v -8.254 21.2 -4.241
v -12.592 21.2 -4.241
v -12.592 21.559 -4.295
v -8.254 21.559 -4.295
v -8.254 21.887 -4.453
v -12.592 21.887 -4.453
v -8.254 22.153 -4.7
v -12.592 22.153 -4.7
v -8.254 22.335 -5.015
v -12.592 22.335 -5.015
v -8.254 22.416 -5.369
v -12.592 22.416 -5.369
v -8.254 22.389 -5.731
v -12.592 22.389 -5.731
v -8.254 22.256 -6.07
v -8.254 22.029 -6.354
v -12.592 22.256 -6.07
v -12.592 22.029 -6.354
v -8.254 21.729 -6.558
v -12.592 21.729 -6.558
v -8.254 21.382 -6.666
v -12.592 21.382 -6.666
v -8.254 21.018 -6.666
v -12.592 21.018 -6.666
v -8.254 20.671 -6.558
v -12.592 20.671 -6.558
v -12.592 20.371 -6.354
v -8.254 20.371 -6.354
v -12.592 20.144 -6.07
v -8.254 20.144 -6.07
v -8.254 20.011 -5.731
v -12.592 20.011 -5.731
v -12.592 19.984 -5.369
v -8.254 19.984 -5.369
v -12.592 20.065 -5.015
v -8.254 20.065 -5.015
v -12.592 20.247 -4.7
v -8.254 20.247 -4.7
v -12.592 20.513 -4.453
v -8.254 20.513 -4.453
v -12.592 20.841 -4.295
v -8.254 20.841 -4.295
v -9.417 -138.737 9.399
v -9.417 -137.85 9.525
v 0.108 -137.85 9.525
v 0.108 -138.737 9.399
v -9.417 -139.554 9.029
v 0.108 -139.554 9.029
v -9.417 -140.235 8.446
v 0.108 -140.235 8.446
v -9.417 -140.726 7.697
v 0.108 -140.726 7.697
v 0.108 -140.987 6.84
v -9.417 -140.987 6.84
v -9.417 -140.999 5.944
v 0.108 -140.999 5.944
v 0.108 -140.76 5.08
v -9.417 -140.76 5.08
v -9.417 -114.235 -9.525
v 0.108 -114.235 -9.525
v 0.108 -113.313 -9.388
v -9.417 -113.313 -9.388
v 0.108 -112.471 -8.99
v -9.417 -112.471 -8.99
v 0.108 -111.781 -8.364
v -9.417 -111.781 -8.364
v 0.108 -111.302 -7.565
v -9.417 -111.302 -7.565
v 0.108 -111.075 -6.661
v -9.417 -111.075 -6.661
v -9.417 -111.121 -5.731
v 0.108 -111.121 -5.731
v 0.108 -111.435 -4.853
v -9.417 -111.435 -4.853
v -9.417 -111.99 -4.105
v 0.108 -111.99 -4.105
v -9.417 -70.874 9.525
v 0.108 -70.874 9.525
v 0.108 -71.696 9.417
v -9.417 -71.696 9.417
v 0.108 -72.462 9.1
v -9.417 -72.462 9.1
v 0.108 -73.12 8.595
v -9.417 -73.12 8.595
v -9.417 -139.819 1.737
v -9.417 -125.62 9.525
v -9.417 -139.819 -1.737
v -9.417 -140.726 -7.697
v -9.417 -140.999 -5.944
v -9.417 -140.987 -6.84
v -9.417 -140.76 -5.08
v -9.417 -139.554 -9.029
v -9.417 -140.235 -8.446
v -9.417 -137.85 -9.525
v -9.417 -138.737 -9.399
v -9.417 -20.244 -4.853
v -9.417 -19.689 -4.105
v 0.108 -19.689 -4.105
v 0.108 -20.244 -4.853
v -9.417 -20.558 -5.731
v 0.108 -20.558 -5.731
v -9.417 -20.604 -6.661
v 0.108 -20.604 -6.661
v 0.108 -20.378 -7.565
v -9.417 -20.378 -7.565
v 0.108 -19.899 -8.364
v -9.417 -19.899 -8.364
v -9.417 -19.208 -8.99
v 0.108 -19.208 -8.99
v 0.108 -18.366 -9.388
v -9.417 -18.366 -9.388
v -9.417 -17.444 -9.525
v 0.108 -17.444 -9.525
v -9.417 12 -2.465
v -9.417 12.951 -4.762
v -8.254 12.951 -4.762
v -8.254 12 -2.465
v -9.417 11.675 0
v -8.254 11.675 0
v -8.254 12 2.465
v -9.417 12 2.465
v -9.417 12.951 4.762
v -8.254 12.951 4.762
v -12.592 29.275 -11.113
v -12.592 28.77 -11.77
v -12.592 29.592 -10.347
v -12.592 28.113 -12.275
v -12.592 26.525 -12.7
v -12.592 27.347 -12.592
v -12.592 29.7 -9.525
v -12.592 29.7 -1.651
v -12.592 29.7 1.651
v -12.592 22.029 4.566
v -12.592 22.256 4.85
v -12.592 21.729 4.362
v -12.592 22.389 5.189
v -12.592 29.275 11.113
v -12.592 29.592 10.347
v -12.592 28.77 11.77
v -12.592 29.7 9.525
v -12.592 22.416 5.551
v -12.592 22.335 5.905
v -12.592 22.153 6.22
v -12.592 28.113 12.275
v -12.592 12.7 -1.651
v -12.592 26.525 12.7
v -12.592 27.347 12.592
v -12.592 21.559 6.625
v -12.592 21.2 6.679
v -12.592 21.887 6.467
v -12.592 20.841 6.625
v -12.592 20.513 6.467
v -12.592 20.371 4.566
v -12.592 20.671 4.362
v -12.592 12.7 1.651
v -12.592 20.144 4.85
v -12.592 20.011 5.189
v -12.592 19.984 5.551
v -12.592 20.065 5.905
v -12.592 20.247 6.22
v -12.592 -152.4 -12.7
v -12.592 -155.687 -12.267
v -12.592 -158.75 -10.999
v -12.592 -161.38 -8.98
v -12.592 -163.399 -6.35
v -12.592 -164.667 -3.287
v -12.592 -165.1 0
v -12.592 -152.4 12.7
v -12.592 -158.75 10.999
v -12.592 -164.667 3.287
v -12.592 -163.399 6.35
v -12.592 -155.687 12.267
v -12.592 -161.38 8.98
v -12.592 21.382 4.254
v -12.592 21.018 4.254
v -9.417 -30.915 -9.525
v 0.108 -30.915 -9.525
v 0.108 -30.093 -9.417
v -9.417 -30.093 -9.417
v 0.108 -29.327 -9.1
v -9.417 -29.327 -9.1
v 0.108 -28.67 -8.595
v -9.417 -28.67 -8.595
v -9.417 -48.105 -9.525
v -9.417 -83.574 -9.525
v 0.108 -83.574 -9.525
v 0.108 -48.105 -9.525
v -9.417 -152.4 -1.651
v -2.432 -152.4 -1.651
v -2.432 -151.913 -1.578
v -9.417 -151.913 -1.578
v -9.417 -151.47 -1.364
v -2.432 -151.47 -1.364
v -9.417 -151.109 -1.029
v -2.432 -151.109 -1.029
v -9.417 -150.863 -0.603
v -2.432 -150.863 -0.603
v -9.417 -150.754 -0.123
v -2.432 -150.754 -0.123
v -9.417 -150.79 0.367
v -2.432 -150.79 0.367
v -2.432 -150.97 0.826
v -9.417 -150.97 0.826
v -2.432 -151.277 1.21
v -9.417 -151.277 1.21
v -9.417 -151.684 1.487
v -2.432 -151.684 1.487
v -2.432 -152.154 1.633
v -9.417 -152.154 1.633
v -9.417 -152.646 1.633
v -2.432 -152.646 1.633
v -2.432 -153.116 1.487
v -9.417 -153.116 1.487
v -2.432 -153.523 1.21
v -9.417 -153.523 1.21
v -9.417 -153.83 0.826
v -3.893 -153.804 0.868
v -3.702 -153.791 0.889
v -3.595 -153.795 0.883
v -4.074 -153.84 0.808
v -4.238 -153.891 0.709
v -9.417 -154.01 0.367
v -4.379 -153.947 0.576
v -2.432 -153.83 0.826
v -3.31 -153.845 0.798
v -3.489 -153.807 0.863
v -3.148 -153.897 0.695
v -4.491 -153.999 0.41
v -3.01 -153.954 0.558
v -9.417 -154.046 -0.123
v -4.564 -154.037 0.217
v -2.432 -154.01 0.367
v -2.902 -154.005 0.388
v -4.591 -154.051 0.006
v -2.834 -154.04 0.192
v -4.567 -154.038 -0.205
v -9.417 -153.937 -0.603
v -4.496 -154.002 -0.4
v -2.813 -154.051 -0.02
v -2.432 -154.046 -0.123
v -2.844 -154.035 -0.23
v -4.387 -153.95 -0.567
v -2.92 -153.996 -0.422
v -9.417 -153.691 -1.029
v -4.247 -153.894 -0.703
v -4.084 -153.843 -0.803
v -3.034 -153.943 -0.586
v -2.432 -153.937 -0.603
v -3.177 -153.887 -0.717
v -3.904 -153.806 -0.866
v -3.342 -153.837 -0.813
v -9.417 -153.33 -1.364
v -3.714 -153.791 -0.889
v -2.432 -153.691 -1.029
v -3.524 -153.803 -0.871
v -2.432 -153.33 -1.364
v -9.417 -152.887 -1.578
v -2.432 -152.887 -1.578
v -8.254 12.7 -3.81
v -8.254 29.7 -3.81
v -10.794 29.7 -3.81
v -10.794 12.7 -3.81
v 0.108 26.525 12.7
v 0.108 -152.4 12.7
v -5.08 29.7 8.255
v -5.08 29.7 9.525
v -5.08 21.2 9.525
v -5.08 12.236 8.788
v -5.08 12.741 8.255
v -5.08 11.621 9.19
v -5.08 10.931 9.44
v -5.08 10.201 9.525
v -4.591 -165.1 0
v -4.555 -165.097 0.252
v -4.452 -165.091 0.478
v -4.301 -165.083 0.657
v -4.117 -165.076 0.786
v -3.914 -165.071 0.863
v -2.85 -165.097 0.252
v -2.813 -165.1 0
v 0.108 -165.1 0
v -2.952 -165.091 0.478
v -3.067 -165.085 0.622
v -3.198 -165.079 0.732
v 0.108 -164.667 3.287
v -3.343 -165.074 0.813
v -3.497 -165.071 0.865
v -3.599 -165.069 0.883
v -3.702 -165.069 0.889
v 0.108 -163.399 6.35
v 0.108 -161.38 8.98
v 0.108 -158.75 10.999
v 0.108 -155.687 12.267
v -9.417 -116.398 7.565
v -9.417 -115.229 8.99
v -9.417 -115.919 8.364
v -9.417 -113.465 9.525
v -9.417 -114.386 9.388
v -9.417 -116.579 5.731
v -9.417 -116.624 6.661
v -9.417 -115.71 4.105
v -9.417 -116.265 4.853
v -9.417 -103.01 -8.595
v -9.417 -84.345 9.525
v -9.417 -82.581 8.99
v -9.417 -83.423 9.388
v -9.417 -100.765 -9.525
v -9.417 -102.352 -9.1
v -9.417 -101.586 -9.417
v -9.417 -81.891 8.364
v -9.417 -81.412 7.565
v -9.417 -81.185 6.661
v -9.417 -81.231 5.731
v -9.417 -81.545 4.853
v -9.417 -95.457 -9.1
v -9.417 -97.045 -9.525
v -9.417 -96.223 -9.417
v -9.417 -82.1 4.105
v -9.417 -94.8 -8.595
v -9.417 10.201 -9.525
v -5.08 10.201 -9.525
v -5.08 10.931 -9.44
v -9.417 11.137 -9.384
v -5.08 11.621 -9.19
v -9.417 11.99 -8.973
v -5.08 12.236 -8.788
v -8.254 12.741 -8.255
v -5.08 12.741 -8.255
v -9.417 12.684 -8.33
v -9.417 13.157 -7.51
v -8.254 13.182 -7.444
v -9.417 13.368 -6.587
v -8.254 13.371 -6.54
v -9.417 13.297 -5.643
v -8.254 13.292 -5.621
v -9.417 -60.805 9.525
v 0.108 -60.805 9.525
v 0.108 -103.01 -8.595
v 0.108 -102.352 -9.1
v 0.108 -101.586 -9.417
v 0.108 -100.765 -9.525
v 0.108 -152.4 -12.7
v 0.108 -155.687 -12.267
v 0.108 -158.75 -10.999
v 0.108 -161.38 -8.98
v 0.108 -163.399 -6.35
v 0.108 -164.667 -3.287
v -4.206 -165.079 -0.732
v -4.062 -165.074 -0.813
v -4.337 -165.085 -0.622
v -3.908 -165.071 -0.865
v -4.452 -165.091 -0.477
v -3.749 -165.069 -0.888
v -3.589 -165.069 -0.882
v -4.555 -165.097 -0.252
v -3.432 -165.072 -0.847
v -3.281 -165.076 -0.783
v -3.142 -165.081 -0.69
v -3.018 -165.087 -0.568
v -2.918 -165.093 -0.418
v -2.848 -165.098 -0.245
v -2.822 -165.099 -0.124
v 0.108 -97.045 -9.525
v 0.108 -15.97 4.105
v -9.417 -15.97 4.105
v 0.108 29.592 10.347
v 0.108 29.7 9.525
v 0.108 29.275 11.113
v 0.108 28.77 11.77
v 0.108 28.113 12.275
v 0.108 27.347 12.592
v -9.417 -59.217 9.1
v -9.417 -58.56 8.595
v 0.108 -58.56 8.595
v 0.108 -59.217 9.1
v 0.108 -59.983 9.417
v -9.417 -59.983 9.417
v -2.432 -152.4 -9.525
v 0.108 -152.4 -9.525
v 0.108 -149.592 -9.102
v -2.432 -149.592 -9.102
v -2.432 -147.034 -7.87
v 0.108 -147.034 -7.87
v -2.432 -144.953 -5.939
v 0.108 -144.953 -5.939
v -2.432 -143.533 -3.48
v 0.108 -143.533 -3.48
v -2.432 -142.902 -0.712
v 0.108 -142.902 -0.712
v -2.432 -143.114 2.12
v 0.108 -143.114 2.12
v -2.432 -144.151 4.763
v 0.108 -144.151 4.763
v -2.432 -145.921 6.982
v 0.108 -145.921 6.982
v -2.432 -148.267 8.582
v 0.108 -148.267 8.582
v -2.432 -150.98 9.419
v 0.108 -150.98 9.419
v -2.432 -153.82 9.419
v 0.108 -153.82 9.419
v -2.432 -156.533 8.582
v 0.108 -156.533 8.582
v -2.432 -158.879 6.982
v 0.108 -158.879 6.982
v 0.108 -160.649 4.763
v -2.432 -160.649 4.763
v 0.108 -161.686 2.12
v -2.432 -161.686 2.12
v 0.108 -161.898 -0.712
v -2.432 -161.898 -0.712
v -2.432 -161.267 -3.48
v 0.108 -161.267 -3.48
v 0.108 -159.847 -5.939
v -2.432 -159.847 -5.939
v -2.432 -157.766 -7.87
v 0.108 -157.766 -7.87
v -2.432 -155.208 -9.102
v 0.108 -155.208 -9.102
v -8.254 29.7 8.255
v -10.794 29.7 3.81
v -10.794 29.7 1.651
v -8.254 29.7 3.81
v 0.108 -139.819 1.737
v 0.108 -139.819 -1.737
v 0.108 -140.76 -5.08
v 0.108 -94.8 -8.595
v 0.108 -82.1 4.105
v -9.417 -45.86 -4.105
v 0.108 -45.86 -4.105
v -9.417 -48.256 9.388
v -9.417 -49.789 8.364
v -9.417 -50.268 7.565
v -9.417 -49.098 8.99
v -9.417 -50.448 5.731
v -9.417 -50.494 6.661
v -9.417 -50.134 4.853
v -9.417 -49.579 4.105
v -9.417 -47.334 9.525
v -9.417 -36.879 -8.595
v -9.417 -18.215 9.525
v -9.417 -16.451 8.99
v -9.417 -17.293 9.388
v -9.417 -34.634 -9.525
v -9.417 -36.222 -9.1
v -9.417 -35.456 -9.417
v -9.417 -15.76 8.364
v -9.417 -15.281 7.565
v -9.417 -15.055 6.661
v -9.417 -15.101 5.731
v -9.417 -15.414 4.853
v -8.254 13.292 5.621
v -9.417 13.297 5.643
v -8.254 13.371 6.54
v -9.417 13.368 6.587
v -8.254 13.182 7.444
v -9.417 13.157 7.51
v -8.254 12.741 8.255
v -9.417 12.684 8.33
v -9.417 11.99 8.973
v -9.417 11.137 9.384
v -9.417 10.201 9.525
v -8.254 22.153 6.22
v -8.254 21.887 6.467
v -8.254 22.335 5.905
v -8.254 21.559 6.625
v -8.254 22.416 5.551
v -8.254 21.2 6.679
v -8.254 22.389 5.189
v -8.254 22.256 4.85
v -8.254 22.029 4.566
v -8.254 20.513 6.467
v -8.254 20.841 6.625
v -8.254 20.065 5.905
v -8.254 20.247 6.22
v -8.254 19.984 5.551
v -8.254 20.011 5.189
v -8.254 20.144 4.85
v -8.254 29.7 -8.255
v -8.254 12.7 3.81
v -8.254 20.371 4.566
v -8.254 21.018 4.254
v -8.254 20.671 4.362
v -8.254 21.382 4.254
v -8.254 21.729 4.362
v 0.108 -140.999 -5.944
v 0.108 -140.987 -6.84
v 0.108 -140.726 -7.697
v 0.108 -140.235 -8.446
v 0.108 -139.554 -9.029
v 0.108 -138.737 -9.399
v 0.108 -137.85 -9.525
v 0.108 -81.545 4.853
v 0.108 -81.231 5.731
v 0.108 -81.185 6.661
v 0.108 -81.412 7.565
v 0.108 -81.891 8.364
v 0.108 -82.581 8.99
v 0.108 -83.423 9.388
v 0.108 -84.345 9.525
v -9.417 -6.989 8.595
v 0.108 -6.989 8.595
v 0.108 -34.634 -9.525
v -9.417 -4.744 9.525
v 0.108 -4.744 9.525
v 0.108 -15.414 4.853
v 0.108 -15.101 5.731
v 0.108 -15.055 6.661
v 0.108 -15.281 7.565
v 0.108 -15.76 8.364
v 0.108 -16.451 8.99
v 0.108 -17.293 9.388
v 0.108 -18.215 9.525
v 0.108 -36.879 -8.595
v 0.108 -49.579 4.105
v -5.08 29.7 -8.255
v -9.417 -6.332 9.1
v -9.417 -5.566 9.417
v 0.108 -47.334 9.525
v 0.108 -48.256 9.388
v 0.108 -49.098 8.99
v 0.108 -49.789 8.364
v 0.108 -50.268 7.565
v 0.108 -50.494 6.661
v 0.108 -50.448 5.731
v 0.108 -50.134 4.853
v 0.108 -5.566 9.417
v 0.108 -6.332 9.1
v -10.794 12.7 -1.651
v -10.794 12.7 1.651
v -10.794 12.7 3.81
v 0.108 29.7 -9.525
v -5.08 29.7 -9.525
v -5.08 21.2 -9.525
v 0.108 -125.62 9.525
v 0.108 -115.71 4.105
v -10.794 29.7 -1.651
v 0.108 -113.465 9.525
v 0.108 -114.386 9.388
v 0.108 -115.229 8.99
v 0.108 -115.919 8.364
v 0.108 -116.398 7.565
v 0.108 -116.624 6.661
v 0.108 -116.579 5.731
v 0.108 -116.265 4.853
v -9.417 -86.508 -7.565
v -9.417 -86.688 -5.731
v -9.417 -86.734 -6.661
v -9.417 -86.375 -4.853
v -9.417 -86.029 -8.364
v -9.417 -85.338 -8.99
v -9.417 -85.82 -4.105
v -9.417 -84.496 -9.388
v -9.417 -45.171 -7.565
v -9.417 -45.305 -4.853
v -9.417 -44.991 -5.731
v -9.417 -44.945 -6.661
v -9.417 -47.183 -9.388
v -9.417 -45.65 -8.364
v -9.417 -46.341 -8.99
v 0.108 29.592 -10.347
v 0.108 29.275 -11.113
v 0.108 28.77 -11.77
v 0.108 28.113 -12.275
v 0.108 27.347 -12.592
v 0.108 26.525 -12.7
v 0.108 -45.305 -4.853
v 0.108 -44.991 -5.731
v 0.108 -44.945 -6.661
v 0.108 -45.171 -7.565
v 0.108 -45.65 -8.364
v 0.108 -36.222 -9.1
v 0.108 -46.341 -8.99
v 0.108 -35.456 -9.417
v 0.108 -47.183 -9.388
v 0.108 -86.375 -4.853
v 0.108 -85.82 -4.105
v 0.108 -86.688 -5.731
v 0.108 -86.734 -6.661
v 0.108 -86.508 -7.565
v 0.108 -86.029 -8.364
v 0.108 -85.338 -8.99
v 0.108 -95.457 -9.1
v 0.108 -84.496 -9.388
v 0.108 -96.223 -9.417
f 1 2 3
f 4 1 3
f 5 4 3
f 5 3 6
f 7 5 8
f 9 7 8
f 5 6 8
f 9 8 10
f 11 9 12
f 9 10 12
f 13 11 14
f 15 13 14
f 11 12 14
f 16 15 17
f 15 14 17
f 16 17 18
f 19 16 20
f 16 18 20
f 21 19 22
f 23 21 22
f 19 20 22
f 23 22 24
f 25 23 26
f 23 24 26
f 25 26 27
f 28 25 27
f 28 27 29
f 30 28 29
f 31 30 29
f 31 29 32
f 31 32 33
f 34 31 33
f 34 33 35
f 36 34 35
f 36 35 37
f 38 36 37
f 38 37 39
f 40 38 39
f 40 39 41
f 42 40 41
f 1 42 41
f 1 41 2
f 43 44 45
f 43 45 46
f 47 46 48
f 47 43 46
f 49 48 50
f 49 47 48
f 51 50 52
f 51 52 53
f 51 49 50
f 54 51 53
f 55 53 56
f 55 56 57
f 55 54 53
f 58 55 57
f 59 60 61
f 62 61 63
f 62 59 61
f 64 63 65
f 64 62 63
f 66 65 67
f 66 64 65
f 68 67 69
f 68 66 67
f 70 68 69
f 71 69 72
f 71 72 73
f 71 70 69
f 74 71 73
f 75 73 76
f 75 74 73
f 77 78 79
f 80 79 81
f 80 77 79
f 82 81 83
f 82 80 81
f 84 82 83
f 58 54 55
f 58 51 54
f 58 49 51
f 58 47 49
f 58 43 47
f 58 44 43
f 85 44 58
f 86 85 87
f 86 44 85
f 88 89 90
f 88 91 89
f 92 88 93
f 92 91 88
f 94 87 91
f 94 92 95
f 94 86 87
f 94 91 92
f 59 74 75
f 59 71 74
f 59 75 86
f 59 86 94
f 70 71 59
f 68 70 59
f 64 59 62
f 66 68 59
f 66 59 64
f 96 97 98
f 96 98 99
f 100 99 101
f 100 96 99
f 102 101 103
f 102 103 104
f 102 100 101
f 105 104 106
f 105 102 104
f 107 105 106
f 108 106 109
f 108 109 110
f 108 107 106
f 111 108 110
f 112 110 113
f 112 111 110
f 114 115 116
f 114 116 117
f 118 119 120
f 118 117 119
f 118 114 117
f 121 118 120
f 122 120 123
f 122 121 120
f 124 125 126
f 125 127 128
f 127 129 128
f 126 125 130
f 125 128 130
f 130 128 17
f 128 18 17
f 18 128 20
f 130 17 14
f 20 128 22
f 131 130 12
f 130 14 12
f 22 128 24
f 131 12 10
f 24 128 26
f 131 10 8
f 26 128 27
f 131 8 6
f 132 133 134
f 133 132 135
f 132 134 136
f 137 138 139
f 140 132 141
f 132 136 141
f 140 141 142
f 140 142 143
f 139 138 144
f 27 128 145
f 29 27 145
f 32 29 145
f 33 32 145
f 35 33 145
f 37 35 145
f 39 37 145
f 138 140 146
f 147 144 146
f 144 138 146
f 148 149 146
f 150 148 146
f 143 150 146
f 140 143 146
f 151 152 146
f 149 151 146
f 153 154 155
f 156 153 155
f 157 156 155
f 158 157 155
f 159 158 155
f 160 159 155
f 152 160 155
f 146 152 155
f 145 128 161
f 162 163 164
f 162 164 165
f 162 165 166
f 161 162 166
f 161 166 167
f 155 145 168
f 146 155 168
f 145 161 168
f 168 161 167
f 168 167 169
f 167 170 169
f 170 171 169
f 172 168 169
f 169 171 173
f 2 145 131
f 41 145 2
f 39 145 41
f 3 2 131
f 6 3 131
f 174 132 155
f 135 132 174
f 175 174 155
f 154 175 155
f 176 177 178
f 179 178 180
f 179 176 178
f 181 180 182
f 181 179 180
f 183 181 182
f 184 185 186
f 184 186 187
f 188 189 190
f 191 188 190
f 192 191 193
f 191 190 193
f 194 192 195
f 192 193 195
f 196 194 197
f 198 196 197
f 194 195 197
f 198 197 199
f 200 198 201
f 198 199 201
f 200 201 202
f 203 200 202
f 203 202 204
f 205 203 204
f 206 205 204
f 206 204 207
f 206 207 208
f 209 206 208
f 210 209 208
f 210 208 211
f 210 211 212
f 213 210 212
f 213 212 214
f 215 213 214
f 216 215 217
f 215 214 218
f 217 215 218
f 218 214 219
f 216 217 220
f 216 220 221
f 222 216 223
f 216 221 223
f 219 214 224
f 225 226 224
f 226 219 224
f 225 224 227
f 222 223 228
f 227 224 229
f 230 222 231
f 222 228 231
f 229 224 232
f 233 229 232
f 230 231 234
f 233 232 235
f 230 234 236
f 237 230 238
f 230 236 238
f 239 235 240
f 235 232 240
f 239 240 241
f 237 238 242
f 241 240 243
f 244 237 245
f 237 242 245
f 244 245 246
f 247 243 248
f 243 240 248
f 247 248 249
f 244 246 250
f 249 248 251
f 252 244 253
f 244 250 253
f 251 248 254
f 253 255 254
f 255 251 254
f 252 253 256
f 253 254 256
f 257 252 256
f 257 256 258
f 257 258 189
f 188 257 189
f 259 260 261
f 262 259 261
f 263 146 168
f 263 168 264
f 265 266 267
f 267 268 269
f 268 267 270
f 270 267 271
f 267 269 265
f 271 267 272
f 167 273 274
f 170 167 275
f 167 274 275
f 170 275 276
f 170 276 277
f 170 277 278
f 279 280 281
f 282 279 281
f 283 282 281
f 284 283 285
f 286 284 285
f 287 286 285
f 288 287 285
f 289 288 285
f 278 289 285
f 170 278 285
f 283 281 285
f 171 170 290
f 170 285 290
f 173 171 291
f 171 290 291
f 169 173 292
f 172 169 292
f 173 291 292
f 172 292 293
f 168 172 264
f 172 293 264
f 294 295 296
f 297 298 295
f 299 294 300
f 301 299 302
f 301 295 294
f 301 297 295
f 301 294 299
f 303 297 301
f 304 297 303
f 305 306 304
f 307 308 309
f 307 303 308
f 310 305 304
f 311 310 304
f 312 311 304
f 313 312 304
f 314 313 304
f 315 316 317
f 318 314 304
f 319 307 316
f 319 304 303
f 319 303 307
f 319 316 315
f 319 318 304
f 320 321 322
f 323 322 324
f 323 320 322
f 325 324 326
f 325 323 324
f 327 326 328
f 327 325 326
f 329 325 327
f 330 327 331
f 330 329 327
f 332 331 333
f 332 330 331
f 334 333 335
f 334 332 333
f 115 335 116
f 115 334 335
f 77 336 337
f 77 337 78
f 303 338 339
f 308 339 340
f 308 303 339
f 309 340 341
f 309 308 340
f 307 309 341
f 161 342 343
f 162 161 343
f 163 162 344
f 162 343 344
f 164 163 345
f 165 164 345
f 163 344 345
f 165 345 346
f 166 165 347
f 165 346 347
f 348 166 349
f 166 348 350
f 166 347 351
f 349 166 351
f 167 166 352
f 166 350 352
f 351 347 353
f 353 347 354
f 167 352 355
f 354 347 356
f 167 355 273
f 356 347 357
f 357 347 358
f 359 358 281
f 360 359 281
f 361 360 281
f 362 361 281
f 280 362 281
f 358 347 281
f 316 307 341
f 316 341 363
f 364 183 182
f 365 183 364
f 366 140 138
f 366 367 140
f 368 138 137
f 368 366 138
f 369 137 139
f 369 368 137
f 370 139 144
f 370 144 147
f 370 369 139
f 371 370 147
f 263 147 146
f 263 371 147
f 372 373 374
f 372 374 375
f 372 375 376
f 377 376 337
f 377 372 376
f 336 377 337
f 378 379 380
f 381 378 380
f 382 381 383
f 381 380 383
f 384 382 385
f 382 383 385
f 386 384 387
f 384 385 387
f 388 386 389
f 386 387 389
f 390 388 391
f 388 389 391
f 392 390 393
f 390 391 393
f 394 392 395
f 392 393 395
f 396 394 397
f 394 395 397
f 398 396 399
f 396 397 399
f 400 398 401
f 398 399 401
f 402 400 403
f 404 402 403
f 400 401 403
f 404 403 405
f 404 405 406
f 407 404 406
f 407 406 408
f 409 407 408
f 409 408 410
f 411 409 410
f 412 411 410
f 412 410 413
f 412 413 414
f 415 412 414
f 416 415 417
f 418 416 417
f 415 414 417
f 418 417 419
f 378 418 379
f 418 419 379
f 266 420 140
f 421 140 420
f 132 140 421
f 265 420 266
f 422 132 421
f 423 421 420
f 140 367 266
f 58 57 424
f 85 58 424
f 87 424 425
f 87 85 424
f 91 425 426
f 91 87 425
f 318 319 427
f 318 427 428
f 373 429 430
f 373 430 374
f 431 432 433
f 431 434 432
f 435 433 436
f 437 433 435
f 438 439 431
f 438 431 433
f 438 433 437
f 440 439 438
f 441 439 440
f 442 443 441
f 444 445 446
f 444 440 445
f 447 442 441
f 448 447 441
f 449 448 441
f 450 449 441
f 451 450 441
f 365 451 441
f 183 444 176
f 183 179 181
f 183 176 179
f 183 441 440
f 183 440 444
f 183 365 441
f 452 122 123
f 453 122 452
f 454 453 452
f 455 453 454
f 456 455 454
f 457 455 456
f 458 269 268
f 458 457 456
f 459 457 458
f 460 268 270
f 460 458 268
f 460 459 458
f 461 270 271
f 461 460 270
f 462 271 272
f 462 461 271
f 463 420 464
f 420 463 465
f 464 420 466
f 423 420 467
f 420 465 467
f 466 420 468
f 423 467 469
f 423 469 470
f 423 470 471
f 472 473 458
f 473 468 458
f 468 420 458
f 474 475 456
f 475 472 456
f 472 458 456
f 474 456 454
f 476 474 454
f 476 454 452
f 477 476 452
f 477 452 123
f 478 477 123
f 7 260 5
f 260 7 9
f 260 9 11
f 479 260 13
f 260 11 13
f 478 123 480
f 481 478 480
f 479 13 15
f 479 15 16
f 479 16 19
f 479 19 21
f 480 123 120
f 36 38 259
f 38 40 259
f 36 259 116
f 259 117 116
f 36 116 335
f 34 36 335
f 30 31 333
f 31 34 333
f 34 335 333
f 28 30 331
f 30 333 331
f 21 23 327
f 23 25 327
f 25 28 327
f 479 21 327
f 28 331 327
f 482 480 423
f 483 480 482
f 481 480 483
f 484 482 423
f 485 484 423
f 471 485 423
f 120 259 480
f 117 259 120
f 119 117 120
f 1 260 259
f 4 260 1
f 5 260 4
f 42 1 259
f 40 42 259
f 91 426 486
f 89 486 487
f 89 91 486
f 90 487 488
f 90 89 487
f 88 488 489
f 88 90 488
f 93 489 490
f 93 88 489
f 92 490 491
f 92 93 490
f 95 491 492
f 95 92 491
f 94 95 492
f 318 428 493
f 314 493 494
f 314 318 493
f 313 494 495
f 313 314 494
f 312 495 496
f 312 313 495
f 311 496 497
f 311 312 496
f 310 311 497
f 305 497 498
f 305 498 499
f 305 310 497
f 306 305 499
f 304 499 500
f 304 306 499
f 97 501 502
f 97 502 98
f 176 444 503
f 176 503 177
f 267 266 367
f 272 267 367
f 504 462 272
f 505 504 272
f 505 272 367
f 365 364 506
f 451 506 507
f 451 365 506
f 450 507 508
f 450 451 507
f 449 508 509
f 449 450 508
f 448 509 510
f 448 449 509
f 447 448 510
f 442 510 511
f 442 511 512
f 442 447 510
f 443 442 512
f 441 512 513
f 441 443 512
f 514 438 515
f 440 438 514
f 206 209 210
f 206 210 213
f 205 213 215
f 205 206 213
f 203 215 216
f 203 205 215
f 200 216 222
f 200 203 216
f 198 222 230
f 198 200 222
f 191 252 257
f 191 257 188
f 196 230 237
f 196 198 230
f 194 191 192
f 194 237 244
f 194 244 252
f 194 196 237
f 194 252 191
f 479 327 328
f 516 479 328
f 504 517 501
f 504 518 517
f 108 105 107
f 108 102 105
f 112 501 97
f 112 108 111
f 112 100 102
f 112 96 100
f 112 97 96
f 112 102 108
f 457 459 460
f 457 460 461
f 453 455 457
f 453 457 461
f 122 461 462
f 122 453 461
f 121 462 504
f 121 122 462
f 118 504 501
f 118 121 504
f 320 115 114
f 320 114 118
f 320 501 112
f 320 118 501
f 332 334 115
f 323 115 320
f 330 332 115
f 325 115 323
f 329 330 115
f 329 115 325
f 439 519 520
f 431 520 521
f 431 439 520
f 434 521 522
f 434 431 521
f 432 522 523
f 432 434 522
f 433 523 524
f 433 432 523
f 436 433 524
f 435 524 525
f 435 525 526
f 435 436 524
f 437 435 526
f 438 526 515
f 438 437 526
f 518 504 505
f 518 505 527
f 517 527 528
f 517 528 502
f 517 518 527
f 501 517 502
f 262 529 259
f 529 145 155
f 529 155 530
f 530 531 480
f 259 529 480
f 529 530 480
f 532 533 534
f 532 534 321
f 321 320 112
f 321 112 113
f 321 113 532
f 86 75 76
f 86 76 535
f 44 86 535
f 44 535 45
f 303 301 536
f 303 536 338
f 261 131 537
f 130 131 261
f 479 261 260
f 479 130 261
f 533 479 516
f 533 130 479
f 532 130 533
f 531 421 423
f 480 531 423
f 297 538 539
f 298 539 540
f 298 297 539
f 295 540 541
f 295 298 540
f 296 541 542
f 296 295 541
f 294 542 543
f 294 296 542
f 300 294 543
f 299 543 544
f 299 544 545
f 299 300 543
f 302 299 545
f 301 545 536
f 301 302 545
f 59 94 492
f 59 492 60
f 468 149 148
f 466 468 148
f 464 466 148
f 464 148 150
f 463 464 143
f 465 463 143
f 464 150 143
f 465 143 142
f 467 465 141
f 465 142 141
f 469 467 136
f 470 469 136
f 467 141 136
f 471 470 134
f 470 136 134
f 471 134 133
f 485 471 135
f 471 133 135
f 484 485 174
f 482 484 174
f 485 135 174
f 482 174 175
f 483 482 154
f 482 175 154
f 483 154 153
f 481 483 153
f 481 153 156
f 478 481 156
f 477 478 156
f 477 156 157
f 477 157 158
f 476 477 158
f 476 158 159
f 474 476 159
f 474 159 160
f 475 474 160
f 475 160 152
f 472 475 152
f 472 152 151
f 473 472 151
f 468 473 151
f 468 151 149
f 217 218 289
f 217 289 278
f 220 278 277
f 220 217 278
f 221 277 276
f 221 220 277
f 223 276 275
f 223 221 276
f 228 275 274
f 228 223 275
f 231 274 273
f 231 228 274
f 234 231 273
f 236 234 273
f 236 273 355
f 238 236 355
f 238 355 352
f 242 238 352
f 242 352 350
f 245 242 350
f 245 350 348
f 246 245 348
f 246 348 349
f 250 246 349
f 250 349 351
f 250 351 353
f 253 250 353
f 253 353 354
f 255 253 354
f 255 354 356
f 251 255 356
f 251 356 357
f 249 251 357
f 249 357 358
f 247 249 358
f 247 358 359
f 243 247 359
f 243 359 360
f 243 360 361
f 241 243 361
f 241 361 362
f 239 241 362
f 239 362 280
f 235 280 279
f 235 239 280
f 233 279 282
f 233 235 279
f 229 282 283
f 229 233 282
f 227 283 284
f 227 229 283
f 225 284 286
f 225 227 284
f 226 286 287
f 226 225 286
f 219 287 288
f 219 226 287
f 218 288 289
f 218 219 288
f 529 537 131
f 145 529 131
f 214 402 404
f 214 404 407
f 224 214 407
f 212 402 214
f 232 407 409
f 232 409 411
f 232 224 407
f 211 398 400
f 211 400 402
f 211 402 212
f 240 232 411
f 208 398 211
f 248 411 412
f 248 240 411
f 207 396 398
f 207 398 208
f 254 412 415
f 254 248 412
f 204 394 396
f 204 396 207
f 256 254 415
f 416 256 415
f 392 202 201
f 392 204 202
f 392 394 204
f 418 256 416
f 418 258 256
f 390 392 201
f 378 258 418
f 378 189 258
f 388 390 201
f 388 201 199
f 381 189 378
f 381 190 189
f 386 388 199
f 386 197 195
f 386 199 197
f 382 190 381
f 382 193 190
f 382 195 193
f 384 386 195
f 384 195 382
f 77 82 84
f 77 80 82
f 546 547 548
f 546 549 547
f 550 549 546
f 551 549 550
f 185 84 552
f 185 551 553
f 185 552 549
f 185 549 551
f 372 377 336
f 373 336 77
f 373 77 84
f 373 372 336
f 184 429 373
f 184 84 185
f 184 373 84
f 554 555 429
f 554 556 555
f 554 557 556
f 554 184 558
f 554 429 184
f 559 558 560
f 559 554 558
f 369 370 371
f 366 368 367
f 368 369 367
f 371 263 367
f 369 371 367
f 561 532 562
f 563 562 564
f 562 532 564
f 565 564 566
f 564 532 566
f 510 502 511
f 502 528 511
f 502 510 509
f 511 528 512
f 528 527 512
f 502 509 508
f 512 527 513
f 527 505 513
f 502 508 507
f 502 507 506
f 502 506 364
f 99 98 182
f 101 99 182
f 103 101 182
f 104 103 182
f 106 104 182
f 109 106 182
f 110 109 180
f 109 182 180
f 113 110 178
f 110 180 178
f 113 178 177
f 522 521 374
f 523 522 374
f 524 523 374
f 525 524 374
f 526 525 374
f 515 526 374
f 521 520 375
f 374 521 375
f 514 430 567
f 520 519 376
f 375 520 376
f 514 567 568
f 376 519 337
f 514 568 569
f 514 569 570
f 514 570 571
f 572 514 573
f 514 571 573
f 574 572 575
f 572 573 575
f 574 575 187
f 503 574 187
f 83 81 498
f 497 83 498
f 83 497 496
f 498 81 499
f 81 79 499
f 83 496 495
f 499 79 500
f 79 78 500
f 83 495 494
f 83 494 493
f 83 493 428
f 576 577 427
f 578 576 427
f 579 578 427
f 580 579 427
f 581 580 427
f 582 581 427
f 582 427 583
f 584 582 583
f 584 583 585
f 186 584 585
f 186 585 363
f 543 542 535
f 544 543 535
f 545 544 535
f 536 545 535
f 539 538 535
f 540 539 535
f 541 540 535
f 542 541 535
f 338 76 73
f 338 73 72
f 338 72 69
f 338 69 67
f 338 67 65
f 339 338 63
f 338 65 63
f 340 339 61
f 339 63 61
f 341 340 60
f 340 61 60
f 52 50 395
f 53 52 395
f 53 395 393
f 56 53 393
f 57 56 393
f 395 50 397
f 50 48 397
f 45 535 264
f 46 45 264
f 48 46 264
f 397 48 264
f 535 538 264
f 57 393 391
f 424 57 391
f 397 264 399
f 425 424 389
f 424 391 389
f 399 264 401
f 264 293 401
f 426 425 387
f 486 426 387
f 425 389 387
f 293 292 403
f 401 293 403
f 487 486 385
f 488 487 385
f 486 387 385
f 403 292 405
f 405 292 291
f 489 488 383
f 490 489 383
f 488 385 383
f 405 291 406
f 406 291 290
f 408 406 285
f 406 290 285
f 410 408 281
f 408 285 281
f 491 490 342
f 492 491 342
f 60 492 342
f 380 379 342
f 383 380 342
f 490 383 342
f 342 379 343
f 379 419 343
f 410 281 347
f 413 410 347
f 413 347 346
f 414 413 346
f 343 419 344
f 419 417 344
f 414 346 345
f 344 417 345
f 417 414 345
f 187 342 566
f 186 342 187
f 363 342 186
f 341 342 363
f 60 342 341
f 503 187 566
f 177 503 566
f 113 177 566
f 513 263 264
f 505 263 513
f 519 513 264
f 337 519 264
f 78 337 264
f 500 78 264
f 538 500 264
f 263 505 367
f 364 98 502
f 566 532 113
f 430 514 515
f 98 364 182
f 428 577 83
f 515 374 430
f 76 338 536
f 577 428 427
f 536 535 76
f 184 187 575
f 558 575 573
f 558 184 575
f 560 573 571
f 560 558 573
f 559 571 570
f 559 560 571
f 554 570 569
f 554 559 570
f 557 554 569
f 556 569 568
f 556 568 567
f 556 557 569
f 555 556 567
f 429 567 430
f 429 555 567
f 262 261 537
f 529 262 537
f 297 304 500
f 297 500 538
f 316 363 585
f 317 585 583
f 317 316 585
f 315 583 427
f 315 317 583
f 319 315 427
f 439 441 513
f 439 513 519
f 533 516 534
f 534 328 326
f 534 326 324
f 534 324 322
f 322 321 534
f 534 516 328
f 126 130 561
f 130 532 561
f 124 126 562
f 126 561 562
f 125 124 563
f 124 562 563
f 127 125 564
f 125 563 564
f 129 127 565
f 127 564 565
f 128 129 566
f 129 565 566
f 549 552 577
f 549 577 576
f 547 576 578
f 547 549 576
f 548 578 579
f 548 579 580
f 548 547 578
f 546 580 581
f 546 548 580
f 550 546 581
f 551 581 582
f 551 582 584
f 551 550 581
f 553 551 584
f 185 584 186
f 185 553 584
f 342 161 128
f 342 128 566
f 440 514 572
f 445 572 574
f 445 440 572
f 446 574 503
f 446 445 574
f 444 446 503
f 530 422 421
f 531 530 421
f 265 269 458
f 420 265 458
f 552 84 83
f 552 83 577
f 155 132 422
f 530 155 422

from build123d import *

# Parameters (mm, degrees)
SKETCH1_R                 = 12.7
BOSS_EXTRUDE1_DEPTH       = 12.7
BOSS_EXTRUDE2_DEPTH       = 17
CUT_EXTRUDE3_DEPTH        = 17
BOSS_EXTRUDE4_REACH       = 36.708
F_2_CLEARANCE_HOLE1_D     = 2.4384
F_2_CLEARANCE_HOLE1_DEPTH = 25.4
F_2_CLEARANCE_HOLE1_TIP   = 0.732569267
SKETCH14_W                = 52.115370156
SKETCH14_H                = 48.846284602
CUT_EXTRUDE4_DEPTH        = 12.7
SKETCH15_W                = 12.7
SKETCH15_H                = 25.4
BOSS_EXTRUDE5_DEPTH       = 177.8
SKETCH16_W                = 12.7
SKETCH16_H                = 3.175
BOSS_EXTRUDE6_DEPTH       = 17
FILLET1_R                 = 3.175
FILLET2_R                 = 12.7
SKETCH17_R                = 1.651
CUT_EXTRUDE5_DEPTH        = 9.525
SKETCH18_R                = 9.525
CUT_EXTRUDE6_DEPTH        = 2.54
CUT_EXTRUDE7_START        = -9.525
CUT_EXTRUDE7_DEPTH        = 9.525
SKETCH23_W                = 12.972727012
SKETCH23_H                = 10.013690803
CUT_EXTRUDE8_DEPTH        = 8.362229451
FILLET3_R                 = 3.175


# Read off the part's stored shape, not the designer's step: Cut-Extrude7
# Some blends are built 0.0001 mm under size
with BuildPart() as part:
    # Sketch1 → Boss-Extrude1 (new body)
    with BuildSketch(Plane(origin=(0, 0, 0), x_dir=(1, 0, 0), z_dir=(0, 1, 0))):
        with Locations(Location((0, 0, 0), (0, 0, 270))):
            Circle(SKETCH1_R)
    extrude(amount=BOSS_EXTRUDE1_DEPTH)

    # Sketch7 → Boss-Extrude2 (add)
    with BuildSketch(Plane(origin=(0, 12.7, 0), x_dir=(1, 0, 0), z_dir=(0, 1, 0))):
        with BuildLine():
            ThreePointArc((-8.400260413, 9.525), (-11.575260413, 5.225260413), (-12.7, 0))
            ThreePointArc((-12.7, 0), (-11.575260413, -5.225260413), (-8.400260413, -9.525))
            Line((-8.400260413, -9.525), (-5.08, -9.525))
            Line((-5.08, -9.525), (-5.08, -8.255))
            Line((-5.08, -8.255), (-8.254457173, -8.255))
            Line((-8.254457173, -8.255), (-8.254457173, 8.255))
            Line((-8.254457173, 8.255), (-5.08, 8.255))
            Line((-5.08, 8.255), (-5.08, 9.525))
            Line((-5.08, 9.525), (-8.400260413, 9.525))
        make_face()
    extrude(amount=BOSS_EXTRUDE2_DEPTH)

    # Sketch8 → Cut-Extrude3 (cut)
    with BuildSketch(Plane(origin=(0, 29.7, 0), x_dir=(1, 0, 0), z_dir=(0, 1, 0))):
        Polygon((-8.254457173, -3.81), (-8.254457173, 3.81), (-10.794457173, 3.81), (-10.794457173, 1.651), (-12.7, 1.651), (-12.7, -1.651), (-10.794457173, -1.651), (-10.794457173, -3.81), align=None)
    extrude(amount=-CUT_EXTRUDE3_DEPTH, mode=Mode.SUBTRACT)

    # Boss-Extrude4: up to this face of the body (flat: up to its plane)
    boss_extrude4_end = Plane(part.part.faces().sort_by_distance((0, 0, 0))[0])
    # Sketch13 → Boss-Extrude4 (add, up to the picked face)
    with BuildSketch(Plane(origin=(0, 29.7, 0), x_dir=(1, 0, 0), z_dir=(0, 1, 0)), mode=Mode.PRIVATE) as boss_extrude4_sk1:
        with BuildLine():
            Line((-12.592227722, 1.651), (-12.592227722, 9.525))
            Line((-12.592227722, 9.525), (-8.400260413, 9.525))
            ThreePointArc((-8.400260413, 9.525), (-11.210312597, 5.968156456), (-12.592227722, 1.651))
        make_face()
    boss_extrude4_tool1 = split(extrude(boss_extrude4_sk1.sketch, amount=-BOSS_EXTRUDE4_REACH, mode=Mode.PRIVATE), bisect_by=boss_extrude4_end, keep=Keep.BOTH, mode=Mode.PRIVATE)
    # Sketch13 → Boss-Extrude4 (add, up to the picked face)
    with BuildSketch(Plane(origin=(0, 29.7, 0), x_dir=(1, 0, 0), z_dir=(0, 1, 0)), mode=Mode.PRIVATE) as boss_extrude4_sk2:
        with BuildLine():
            Line((-12.592227722, -1.651), (-12.592227722, -9.525))
            Line((-12.592227722, -9.525), (-8.400260413, -9.525))
            ThreePointArc((-8.400260413, -9.525), (-11.210312597, -5.968156456), (-12.592227722, -1.651))
        make_face()
    boss_extrude4_tool2 = split(extrude(boss_extrude4_sk2.sketch, amount=-BOSS_EXTRUDE4_REACH, mode=Mode.PRIVATE), bisect_by=boss_extrude4_end, keep=Keep.BOTH, mode=Mode.PRIVATE)
    add(boss_extrude4_tool1.solids().sort_by(Axis((-11.366083, 29.7, -7.381946), (0, -1, 0)))[0])
    add(boss_extrude4_tool2.solids().sort_by(Axis((-11.366083, 29.7, 7.381946), (0, -1, 0)))[0])

    # #2 Clearance Hole1
    with Locations(Plane(origin=(-8.254457173, 0, 0), x_dir=(0, 0, -1), z_dir=(1, 0, 0))):
        with Locations((-5.46, 21.2), (5.46, 21.2)):
            Hole(F_2_CLEARANCE_HOLE1_D / 2, depth=F_2_CLEARANCE_HOLE1_DEPTH)
            with Locations((0, 0, -(F_2_CLEARANCE_HOLE1_DEPTH + F_2_CLEARANCE_HOLE1_TIP / 2))):  # 118° drill point
                Cone(0, F_2_CLEARANCE_HOLE1_D / 2, F_2_CLEARANCE_HOLE1_TIP, mode=Mode.SUBTRACT)

    # Sketch14 → Cut-Extrude4 (cut)
    with BuildSketch(Plane(origin=(0, 12.7, 0), x_dir=(1, 0, 0), z_dir=(0, 1, 0))):
        Rectangle(SKETCH14_W, SKETCH14_H)
    extrude(amount=-CUT_EXTRUDE4_DEPTH, mode=Mode.SUBTRACT)


with BuildPart() as cut_extrude4_piece_1:
    # of the separate pieces the step leaves, piece 1, a body of its own (cut_extrude4_pieces)
    add(part.part.solids().sort_by_distance((-5.08, 29.7, 9.525))[0])



with BuildPart() as cut_extrude4_piece_2:
    # of the separate pieces the step leaves, piece 2, a body of its own (cut_extrude4_pieces)
    add(part.part.solids().sort_by_distance((-12.592227722, 29.7, -9.525))[0])


with BuildPart() as cut_extrude4_piece_1_1:
    add(cut_extrude4_piece_1.part)

    add(cut_extrude4_piece_2.part)  # Boss-Extrude5 merges Cut-Extrude4 piece 2
    # Sketch15 → Boss-Extrude5 (add)
    with BuildSketch(Plane.XZ.offset(-12.7)):
        with Locations((-6.242227722, 0)):
            Rectangle(SKETCH15_W, SKETCH15_H)
    extrude(amount=BOSS_EXTRUDE5_DEPTH)

    # Sketch16 → Boss-Extrude6 (add)
    with BuildSketch(Plane(origin=(0, 12.7, 0), x_dir=(1, 0, 0), z_dir=(0, 1, 0))):
        with Locations((-6.242227722, 11.1125)):
            Rectangle(SKETCH16_W, SKETCH16_H)
        with Locations((-6.242227722, -11.1125)):
            Rectangle(SKETCH16_W, SKETCH16_H)
    extrude(amount=BOSS_EXTRUDE6_DEPTH)

    # Fillet1
    fillet1_edges = [cut_extrude4_piece_1_1.edges().sort_by_distance(p)[0] for p in [
        (-6.242227722, 29.7, 12.7),
        (-6.242227722, 29.7, -12.7),
    ]]
    fillet(fillet1_edges, radius=FILLET1_R - 0.0001)  # a hair under: the kernel refuses the full size

    # Fillet2
    fillet2_edges = [cut_extrude4_piece_1_1.edges().sort_by_distance(p)[0] for p in [
        (-6.242227722, -165.1, 12.7),
        (-6.242227722, -165.1, -12.7),
    ]]
    fillet(fillet2_edges, radius=FILLET2_R - 0.0001)  # a hair under: the kernel refuses the full size

    # Sketch17 → Cut-Extrude5 (cut)
    with BuildSketch(Plane(origin=(0.107772278, 0, 0), x_dir=(0, 0, -1), z_dir=(1, 0, 0))):
        with Locations((0, -152.4)):
            Circle(SKETCH17_R)
    extrude(amount=-CUT_EXTRUDE5_DEPTH, mode=Mode.SUBTRACT)

    # Sketch18 → Cut-Extrude6 (cut)
    with BuildSketch(Plane(origin=(0.107772278, 0, 0), x_dir=(0, 0, -1), z_dir=(1, 0, 0))):
        with Locations((0, -152.4)):
            Circle(SKETCH18_R)
    extrude(amount=-CUT_EXTRUDE6_DEPTH, mode=Mode.SUBTRACT)

    # Sketch19 → #2-56 Tapped Hole1 (revolve, cut)
    with BuildSketch(Plane(origin=(-3.702227722, -152.4, 0), x_dir=(0, 0, 1), z_dir=(1, 0, 0))):
        Polygon((0, 0), (0, 13.74216509), (0.889, 13.208), (0.889, 0), align=None)
    revolve(axis=Axis((-3.702227722, -146.05, 0), (0, -1, 0)), mode=Mode.SUBTRACT)

    # Cut-Extrude7 outline → Cut-Extrude7 (cut)
    with BuildSketch(Plane(origin=(0.107772278, 0, 0), x_dir=(0, 0, -1), z_dir=(1, 0, 0)).offset(CUT_EXTRUDE7_START)):
        with BuildLine():
            Line((-9.525, -6.059343702), (9.525, -25.109343702))
            Line((9.525, -25.109343702), (9.525, 21.2))
            ThreePointArc((9.525, 21.2), (0, 11.675), (-9.525, 21.2))
            Line((-9.525, 21.2), (-9.525, -6.059343702))
        make_face()
        Polygon((-9.525, -54.999471762), (9.525, -35.949471762), (9.525, -29.599471762), (-9.525, -10.549471762), align=None)
        Polygon((-9.525, -72.189599823), (9.525, -91.239599823), (9.525, -40.439599823), (-9.525, -59.489599823), align=None)
        Polygon((-9.525, -121.129727883), (9.525, -102.079727883), (9.525, -95.729727883), (-9.525, -76.679727883), align=None)
        with BuildLine():
            ThreePointArc((-9.525, -143.999739587), (0, -139.7), (9.525, -143.999739587))
            Line((9.525, -143.999739587), (9.525, -106.569855944))
            Line((9.525, -106.569855944), (-9.525, -125.619855944))
            Line((-9.525, -125.619855944), (-9.525, -143.999739587))
        make_face()
    extrude(amount=CUT_EXTRUDE7_DEPTH, mode=Mode.SUBTRACT)

    # Sketch23 → Cut-Extrude8 (cut)
    with BuildSketch(Plane(origin=(-8.254457173, 0, 0), x_dir=(0, 0, -1), z_dir=(1, 0, 0))):
        with Locations((0.296508778, 11.530489285)):
            Rectangle(SKETCH23_W, SKETCH23_H)
    extrude(amount=CUT_EXTRUDE8_DEPTH, mode=Mode.SUBTRACT)

    # Fillet3
    # the kernel refuses this fillet: 3.175 mm, written as the material it adds along each edge
    with BuildSketch(Plane(origin=(-12.705047873, -6.059343702, 9.525), x_dir=(0, -0.7071067811865476, -0.7071067811865476), z_dir=(1, 0, 0))) as fillet3_piece_1_section:
        with BuildLine():
            CenterArc((FILLET3_R * 0.414213562373, FILLET3_R), FILLET3_R, 225, 45)
            Line((-FILLET3_R * 0.292893218813, FILLET3_R * 0.292893218813), (0, 0))
            Line((0, 0), (FILLET3_R * 0.414213562373, 0))
        make_face()
    fillet3_piece_1 = extrude(amount=12.812820151, mode=Mode.PRIVATE)
    fillet3_piece_1 = split(fillet3_piece_1, bisect_by=Plane(origin=(-12.592227722, -5.980218736, 9.333975434), z_dir=(1, 0, 0)), keep=Keep.TOP, mode=Mode.PRIVATE)
    add(fillet3_piece_1)
    with BuildSketch(Plane(origin=(-28.580047873, -25.109343702, -9.525), x_dir=(0, 1, 0), z_dir=(1, 0, 0))) as fillet3_piece_2_section:
        with BuildLine():
            CenterArc((FILLET3_R * 2.41421356237, FILLET3_R), FILLET3_R, 135, 135)
            Line((FILLET3_R * 1.70710678119, FILLET3_R * 1.70710678119), (0, 0))
            Line((0, 0), (FILLET3_R * 2.41421356237, 0))
        make_face()
    fillet3_piece_2 = extrude(amount=28.687820151, mode=Mode.PRIVATE)
    fillet3_piece_2 = split(fillet3_piece_2, bisect_by=Plane(origin=(-12.592227722, -21.703583978, -8.114288132), z_dir=(1, 0, 0)), keep=Keep.TOP, mode=Mode.PRIVATE)
    add(fillet3_piece_2)
    with BuildSketch(Plane(origin=(-36.913534292, 21.2, -9.525), x_dir=(0, -0.8660254037844385, 0.5000000000000003), z_dir=(1, 0, 0))) as fillet3_piece_3_section:
        with BuildLine():
            CenterArc((11.1125, 2.749630657), FILLET3_R, 120, 120)
            Line((9.525, 5.499261314), (0, 0))
            ThreePointArc((0, 0), (4.7625, 1.276108029), (9.525, 0))
        make_face()
    fillet3_piece_3 = extrude(amount=59.329840862, mode=Mode.PRIVATE)
    fillet3_piece_3 = split(fillet3_piece_3, bisect_by=Plane(origin=(-8.254457173, 14.198741561, -7.389428404), z_dir=(-1, 0, 0)), keep=Keep.TOP, mode=Mode.PRIVATE)
    fillet3_piece_3 = split(fillet3_piece_3, bisect_by=Plane(origin=(-12.592227722, 14.198741561, -7.389428404), z_dir=(1, 0, 0)), keep=Keep.TOP, mode=Mode.PRIVATE)
    add(fillet3_piece_3)
    with BuildSketch(Plane(origin=(-36.913534292, 21.2, -9.525), x_dir=(0, -0.8660254037844385, 0.5000000000000003), z_dir=(1, 0, 0))) as fillet3_piece_4_section:
        with BuildLine():
            CenterArc((11.1125, 2.749630657), FILLET3_R, 120, 120)
            Line((9.525, 5.499261314), (0, 0))
            ThreePointArc((0, 0), (4.7625, 1.276108029), (9.525, 0))
        make_face()
    fillet3_piece_4 = extrude(amount=31.833534292, mode=Mode.PRIVATE)
    fillet3_piece_4 = split(fillet3_piece_4, bisect_by=Plane(origin=(-6.667228586, 15.056349516, -8.255), z_dir=(0, 0, -1)), keep=Keep.TOP, mode=Mode.PRIVATE)
    fillet3_piece_4 = split(fillet3_piece_4, bisect_by=Plane(origin=(-12.592227722, 15.056349516, -8.990866495), z_dir=(1, 0, 0)), keep=Keep.TOP, mode=Mode.PRIVATE)
    add(fillet3_piece_4)
    with BuildSketch(Plane(origin=(-36.913534292, 21.2, 9.525), x_dir=(0, -0.8660254037844385, -0.5000000000000003), z_dir=(1, 0, 0))) as fillet3_piece_5_section:
        with BuildLine():
            CenterArc((11.1125, -2.749630657), FILLET3_R, 120, 120)
            Line((9.525, -5.499261314), (0, 0))
            ThreePointArc((0, 0), (4.7625, -1.276108029), (9.525, 0))
        make_face()
    fillet3_piece_5 = extrude(amount=59.329840862, mode=Mode.PRIVATE)
    fillet3_piece_5 = split(fillet3_piece_5, bisect_by=Plane(origin=(-8.254457173, 14.198741561, 7.389428404), z_dir=(-1, 0, 0)), keep=Keep.TOP, mode=Mode.PRIVATE)
    fillet3_piece_5 = split(fillet3_piece_5, bisect_by=Plane(origin=(-12.592227722, 14.198741561, 7.389428404), z_dir=(1, 0, 0)), keep=Keep.TOP, mode=Mode.PRIVATE)
    add(fillet3_piece_5)
    with BuildSketch(Plane(origin=(-36.913534292, 21.2, 9.525), x_dir=(0, -0.8660254037844385, -0.5000000000000003), z_dir=(1, 0, 0))) as fillet3_piece_6_section:
        with BuildLine():
            CenterArc((11.1125, -2.749630657), FILLET3_R, 120, 120)
            Line((9.525, -5.499261314), (0, 0))
            ThreePointArc((0, 0), (4.7625, -1.276108029), (9.525, 0))
        make_face()
    fillet3_piece_6 = extrude(amount=31.833534292, mode=Mode.PRIVATE)
    fillet3_piece_6 = split(fillet3_piece_6, bisect_by=Plane(origin=(-6.667228586, 15.056349516, 8.255), z_dir=(0, 0, 1)), keep=Keep.TOP, mode=Mode.PRIVATE)
    fillet3_piece_6 = split(fillet3_piece_6, bisect_by=Plane(origin=(-12.592227722, 15.056349516, 8.990866495), z_dir=(1, 0, 0)), keep=Keep.TOP, mode=Mode.PRIVATE)
    add(fillet3_piece_6)
    with BuildSketch(Plane(origin=(-28.580047873, -10.549471762, 9.525), x_dir=(0, -0.7071067811865476, -0.7071067811865475), z_dir=(1, 0, 0))) as fillet3_piece_7_section:
        with BuildLine():
            CenterArc((FILLET3_R * 2.41421356237, -FILLET3_R), FILLET3_R, 90, 135)
            Line((FILLET3_R * 1.70710678119, -FILLET3_R * 1.70710678119), (0, 0))
            Line((0, 0), (FILLET3_R * 2.41421356237, 0))
        make_face()
    fillet3_piece_7 = extrude(amount=28.687820151, mode=Mode.PRIVATE)
    fillet3_piece_7 = split(fillet3_piece_7, bisect_by=Plane(origin=(-12.592227722, -13.955231486, 8.114288132), z_dir=(1, 0, 0)), keep=Keep.TOP, mode=Mode.PRIVATE)
    add(fillet3_piece_7)
    with BuildSketch(Plane(origin=(-28.580047873, -54.999471762, 9.525), x_dir=(0, 0.7071067811865476, -0.7071067811865475), z_dir=(1, 0, 0))) as fillet3_piece_8_section:
        with BuildLine():
            CenterArc((FILLET3_R * 2.41421356237, FILLET3_R), FILLET3_R, 135, 135)
            Line((FILLET3_R * 1.70710678119, FILLET3_R * 1.70710678119), (0, 0))
            Line((0, 0), (FILLET3_R * 2.41421356237, 0))
        make_face()
    fillet3_piece_8 = extrude(amount=28.687820151, mode=Mode.PRIVATE)
    fillet3_piece_8 = split(fillet3_piece_8, bisect_by=Plane(origin=(-12.592227722, -51.593712038, 8.114288132), z_dir=(1, 0, 0)), keep=Keep.TOP, mode=Mode.PRIVATE)
    add(fillet3_piece_8)
    with BuildSketch(Plane(origin=(-12.705047873, -35.949471762, -9.525), x_dir=(0, 1, 0), z_dir=(1, 0, 0))) as fillet3_piece_9_section:
        with BuildLine():
            CenterArc((FILLET3_R * 0.414213562373, FILLET3_R), FILLET3_R, 225, 45)
            Line((-FILLET3_R * 0.292893218813, FILLET3_R * 0.292893218813), (0, 0))
            Line((0, 0), (FILLET3_R * 0.414213562373, 0))
        make_face()
    fillet3_piece_9 = extrude(amount=12.812820151, mode=Mode.PRIVATE)
    fillet3_piece_9 = split(fillet3_piece_9, bisect_by=Plane(origin=(-12.592227722, -35.870346796, -9.333975434), z_dir=(1, 0, 0)), keep=Keep.TOP, mode=Mode.PRIVATE)
    add(fillet3_piece_9)
    with BuildSketch(Plane(origin=(-12.705047873, -29.599471762, -9.525), x_dir=(0, 0.7071067811865481, 0.7071067811865468), z_dir=(1, 0, 0))) as fillet3_piece_10_section:
        with BuildLine():
            CenterArc((FILLET3_R * 0.414213562373, FILLET3_R), FILLET3_R, 225, 45)
            Line((-FILLET3_R * 0.292893218813, FILLET3_R * 0.292893218813), (0, 0))
            Line((0, 0), (FILLET3_R * 0.414213562373, 0))
        make_face()
    fillet3_piece_10 = extrude(amount=12.812820151, mode=Mode.PRIVATE)
    fillet3_piece_10 = split(fillet3_piece_10, bisect_by=Plane(origin=(-12.592227722, -29.678596728, -9.333975434), z_dir=(1, 0, 0)), keep=Keep.TOP, mode=Mode.PRIVATE)
    add(fillet3_piece_10)
    with BuildSketch(Plane(origin=(-12.705047873, -72.189599823, 9.525), x_dir=(0, -0.7071067811865476, -0.7071067811865476), z_dir=(1, 0, 0))) as fillet3_piece_11_section:
        with BuildLine():
            CenterArc((FILLET3_R * 0.414213562373, FILLET3_R), FILLET3_R, 225, 45)
            Line((-FILLET3_R * 0.292893218813, FILLET3_R * 0.292893218813), (0, 0))
            Line((0, 0), (FILLET3_R * 0.414213562373, 0))
        make_face()
    fillet3_piece_11 = extrude(amount=12.812820151, mode=Mode.PRIVATE)
    fillet3_piece_11 = split(fillet3_piece_11, bisect_by=Plane(origin=(-12.592227722, -72.110474857, 9.333975434), z_dir=(1, 0, 0)), keep=Keep.TOP, mode=Mode.PRIVATE)
    add(fillet3_piece_11)
    with BuildSketch(Plane(origin=(-28.580047873, -91.239599823, -9.525), x_dir=(0, 1, 0), z_dir=(1, 0, 0))) as fillet3_piece_12_section:
        with BuildLine():
            CenterArc((FILLET3_R * 2.41421356237, FILLET3_R), FILLET3_R, 135, 135)
            Line((FILLET3_R * 1.70710678119, FILLET3_R * 1.70710678119), (0, 0))
            Line((0, 0), (FILLET3_R * 2.41421356237, 0))
        make_face()
    fillet3_piece_12 = extrude(amount=28.687820151, mode=Mode.PRIVATE)
    fillet3_piece_12 = split(fillet3_piece_12, bisect_by=Plane(origin=(-12.592227722, -87.833840099, -8.114288132), z_dir=(1, 0, 0)), keep=Keep.TOP, mode=Mode.PRIVATE)
    add(fillet3_piece_12)
    with BuildSketch(Plane(origin=(-28.580047873, -40.439599823, -9.525), x_dir=(0, -0.7071067811865476, 0.7071067811865475), z_dir=(1, 0, 0))) as fillet3_piece_13_section:
        with BuildLine():
            CenterArc((FILLET3_R * 2.41421356237, FILLET3_R), FILLET3_R, 135, 135)
            Line((FILLET3_R * 1.70710678119, FILLET3_R * 1.70710678119), (0, 0))
            Line((0, 0), (FILLET3_R * 2.41421356237, 0))
        make_face()
    fillet3_piece_13 = extrude(amount=28.687820151, mode=Mode.PRIVATE)
    fillet3_piece_13 = split(fillet3_piece_13, bisect_by=Plane(origin=(-12.592227722, -43.845359547, -8.114288132), z_dir=(1, 0, 0)), keep=Keep.TOP, mode=Mode.PRIVATE)
    add(fillet3_piece_13)
    with BuildSketch(Plane(origin=(-12.705047873, -59.489599823, 9.525), x_dir=(0, 0.7071067811865468, -0.7071067811865481), z_dir=(1, 0, 0))) as fillet3_piece_14_section:
        with BuildLine():
            CenterArc((FILLET3_R * 0.414213562373, -FILLET3_R), FILLET3_R, 90, 45)
            Line((-FILLET3_R * 0.292893218813, -FILLET3_R * 0.292893218813), (0, 0))
            Line((0, 0), (FILLET3_R * 0.414213562373, 0))
        make_face()
    fillet3_piece_14 = extrude(amount=12.812820151, mode=Mode.PRIVATE)
    fillet3_piece_14 = split(fillet3_piece_14, bisect_by=Plane(origin=(-12.592227722, -59.568724789, 9.333975434), z_dir=(1, 0, 0)), keep=Keep.TOP, mode=Mode.PRIVATE)
    add(fillet3_piece_14)
    with BuildSketch(Plane(origin=(-28.580047873, -76.679727883, 9.525), x_dir=(0, -0.7071067811865475, -0.7071067811865476), z_dir=(1, 0, 0))) as fillet3_piece_15_section:
        with BuildLine():
            CenterArc((FILLET3_R * 2.41421356237, -FILLET3_R), FILLET3_R, 90, 135)
            Line((FILLET3_R * 1.70710678119, -FILLET3_R * 1.70710678119), (0, 0))
            Line((0, 0), (FILLET3_R * 2.41421356237, 0))
        make_face()
    fillet3_piece_15 = extrude(amount=28.687820151, mode=Mode.PRIVATE)
    fillet3_piece_15 = split(fillet3_piece_15, bisect_by=Plane(origin=(-12.592227722, -80.085487607, 8.114288132), z_dir=(1, 0, 0)), keep=Keep.TOP, mode=Mode.PRIVATE)
    add(fillet3_piece_15)
    with BuildSketch(Plane(origin=(-28.580047873, -121.129727883, 9.525), x_dir=(0, 0.7071067811865472, -0.7071067811865479), z_dir=(1, 0, 0))) as fillet3_piece_16_section:
        with BuildLine():
            CenterArc((FILLET3_R * 2.41421356237, FILLET3_R), FILLET3_R, 135, 135)
            Line((FILLET3_R * 1.70710678119, FILLET3_R * 1.70710678119), (0, 0))
            Line((0, 0), (FILLET3_R * 2.41421356237, 0))
        make_face()
    fillet3_piece_16 = extrude(amount=28.687820151, mode=Mode.PRIVATE)
    fillet3_piece_16 = split(fillet3_piece_16, bisect_by=Plane(origin=(-12.592227722, -117.723968159, 8.114288132), z_dir=(1, 0, 0)), keep=Keep.TOP, mode=Mode.PRIVATE)
    add(fillet3_piece_16)
    with BuildSketch(Plane(origin=(-12.705047873, -102.079727883, -9.525), x_dir=(0, 1, 0), z_dir=(1, 0, 0))) as fillet3_piece_17_section:
        with BuildLine():
            CenterArc((FILLET3_R * 0.414213562373, FILLET3_R), FILLET3_R, 225, 45)
            Line((-FILLET3_R * 0.292893218813, FILLET3_R * 0.292893218813), (0, 0))
            Line((0, 0), (FILLET3_R * 0.414213562373, 0))
        make_face()
    fillet3_piece_17 = extrude(amount=12.812820151, mode=Mode.PRIVATE)
    fillet3_piece_17 = split(fillet3_piece_17, bisect_by=Plane(origin=(-12.592227722, -102.000602917, -9.333975434), z_dir=(1, 0, 0)), keep=Keep.TOP, mode=Mode.PRIVATE)
    add(fillet3_piece_17)
    with BuildSketch(Plane(origin=(-12.705047873, -95.729727883, -9.525), x_dir=(0, 0.7071067811865455, 0.7071067811865495), z_dir=(1, 0, 0))) as fillet3_piece_18_section:
        with BuildLine():
            CenterArc((FILLET3_R * 0.414213562373, FILLET3_R), FILLET3_R, 225, 45)
            Line((-FILLET3_R * 0.292893218813, FILLET3_R * 0.292893218813), (0, 0))
            Line((0, 0), (FILLET3_R * 0.414213562373, 0))
        make_face()
    fillet3_piece_18 = extrude(amount=12.812820151, mode=Mode.PRIVATE)
    fillet3_piece_18 = split(fillet3_piece_18, bisect_by=Plane(origin=(-12.592227722, -95.808852849, -9.333975434), z_dir=(1, 0, 0)), keep=Keep.TOP, mode=Mode.PRIVATE)
    add(fillet3_piece_18)
    with BuildSketch(Plane(origin=(-28.580047873, -106.569855944, -9.525), x_dir=(0, -0.7071067811865474, 0.7071067811865476), z_dir=(1, 0, 0))) as fillet3_piece_19_section:
        with BuildLine():
            CenterArc((FILLET3_R * 2.41421356237, FILLET3_R), FILLET3_R, 135, 135)
            Line((FILLET3_R * 1.70710678119, FILLET3_R * 1.70710678119), (0, 0))
            Line((0, 0), (FILLET3_R * 2.41421356237, 0))
        make_face()
    fillet3_piece_19 = extrude(amount=28.687820151, mode=Mode.PRIVATE)
    fillet3_piece_19 = split(fillet3_piece_19, bisect_by=Plane(origin=(-12.592227722, -109.975615668, -8.114288132), z_dir=(1, 0, 0)), keep=Keep.TOP, mode=Mode.PRIVATE)
    add(fillet3_piece_19)
    with BuildSketch(Plane(origin=(-24.790771268, -143.999739587, 9.525), x_dir=(0, 0.5889746247804543, -0.8081515274778135), z_dir=(1, 0, 0))) as fillet3_piece_20_section:
        with BuildLine():
            CenterArc((6.187731916, 3.099666646), FILLET3_R, 143.915721818, 113.578178477)
            Line((3.621850817, 4.96966108), (0, 0))
            ThreePointArc((0, 0), (2.750103074, 0.301333415), (5.500206148, 0))
        make_face()
    fillet3_piece_20 = extrude(amount=24.898543546, mode=Mode.PRIVATE)
    fillet3_piece_20 = split(fillet3_piece_20, bisect_by=Plane(origin=(-12.592227722, -141.454802798, 8.459851128), z_dir=(1, 0, 0)), keep=Keep.TOP, mode=Mode.PRIVATE)
    add(fillet3_piece_20)
    with BuildSketch(Plane(origin=(-24.790771268, -143.999739587, -9.525), x_dir=(0, 1, 0), z_dir=(1, 0, 0))) as fillet3_piece_21_section:
        with BuildLine():
            CenterArc((6.149417419, 3.175), FILLET3_R, 156.421821523, 113.578178477)
            ThreePointArc((3.239481852, 4.445), (1.863263986, 2.045022265), (0, 0))
            Line((0, 0), (6.149417419, 0))
        make_face()
    fillet3_piece_21 = extrude(amount=24.898543546, mode=Mode.PRIVATE)
    fillet3_piece_21 = split(fillet3_piece_21, bisect_by=Plane(origin=(-12.592227722, -141.454802798, -8.459851128), z_dir=(1, 0, 0)), keep=Keep.TOP, mode=Mode.PRIVATE)
    add(fillet3_piece_21)


solid = cut_extrude4_piece_1_1.part
